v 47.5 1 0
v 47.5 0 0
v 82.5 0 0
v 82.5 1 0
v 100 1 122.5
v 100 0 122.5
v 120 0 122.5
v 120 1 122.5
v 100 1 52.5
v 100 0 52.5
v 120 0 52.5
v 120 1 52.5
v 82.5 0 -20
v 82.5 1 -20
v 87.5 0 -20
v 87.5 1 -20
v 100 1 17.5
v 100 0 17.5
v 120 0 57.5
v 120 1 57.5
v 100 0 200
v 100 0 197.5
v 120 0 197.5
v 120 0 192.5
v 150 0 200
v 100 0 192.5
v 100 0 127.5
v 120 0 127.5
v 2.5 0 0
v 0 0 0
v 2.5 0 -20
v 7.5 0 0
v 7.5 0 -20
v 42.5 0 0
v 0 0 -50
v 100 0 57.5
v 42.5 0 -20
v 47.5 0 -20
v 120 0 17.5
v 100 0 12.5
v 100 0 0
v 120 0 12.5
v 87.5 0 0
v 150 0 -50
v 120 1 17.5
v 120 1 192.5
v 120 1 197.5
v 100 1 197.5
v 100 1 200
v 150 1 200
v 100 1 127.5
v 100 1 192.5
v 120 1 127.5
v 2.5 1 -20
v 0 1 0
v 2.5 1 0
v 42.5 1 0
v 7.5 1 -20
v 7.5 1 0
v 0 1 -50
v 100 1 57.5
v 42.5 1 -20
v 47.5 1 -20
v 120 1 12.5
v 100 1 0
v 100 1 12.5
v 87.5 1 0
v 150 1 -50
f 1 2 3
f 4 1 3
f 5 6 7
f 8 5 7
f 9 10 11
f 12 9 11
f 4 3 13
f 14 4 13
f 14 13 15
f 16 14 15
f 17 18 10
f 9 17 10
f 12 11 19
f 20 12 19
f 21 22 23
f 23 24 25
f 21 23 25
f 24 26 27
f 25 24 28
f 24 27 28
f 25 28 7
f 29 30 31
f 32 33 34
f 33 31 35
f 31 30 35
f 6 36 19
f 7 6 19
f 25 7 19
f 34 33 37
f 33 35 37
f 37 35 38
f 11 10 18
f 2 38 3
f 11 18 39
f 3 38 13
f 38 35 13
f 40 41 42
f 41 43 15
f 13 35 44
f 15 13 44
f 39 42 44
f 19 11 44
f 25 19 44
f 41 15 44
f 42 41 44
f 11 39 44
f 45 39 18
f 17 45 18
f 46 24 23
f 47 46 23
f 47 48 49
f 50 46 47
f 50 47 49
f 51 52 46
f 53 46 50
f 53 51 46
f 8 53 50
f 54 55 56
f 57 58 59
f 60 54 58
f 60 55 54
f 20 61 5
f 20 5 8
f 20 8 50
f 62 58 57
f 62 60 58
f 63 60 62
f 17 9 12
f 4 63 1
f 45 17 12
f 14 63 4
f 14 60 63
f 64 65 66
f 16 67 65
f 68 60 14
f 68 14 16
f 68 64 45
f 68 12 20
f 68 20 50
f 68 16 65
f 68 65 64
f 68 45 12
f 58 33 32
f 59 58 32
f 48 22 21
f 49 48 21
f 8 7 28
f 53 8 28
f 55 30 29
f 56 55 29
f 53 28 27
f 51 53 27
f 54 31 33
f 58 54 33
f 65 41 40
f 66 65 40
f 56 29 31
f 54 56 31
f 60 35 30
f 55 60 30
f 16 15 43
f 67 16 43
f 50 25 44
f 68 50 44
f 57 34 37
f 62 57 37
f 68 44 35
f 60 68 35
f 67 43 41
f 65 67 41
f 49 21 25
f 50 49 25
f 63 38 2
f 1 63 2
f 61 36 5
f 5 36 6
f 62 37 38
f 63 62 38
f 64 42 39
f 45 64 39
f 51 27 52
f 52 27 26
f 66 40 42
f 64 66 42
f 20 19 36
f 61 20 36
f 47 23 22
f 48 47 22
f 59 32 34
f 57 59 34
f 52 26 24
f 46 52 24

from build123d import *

# Parameters (mm, degrees)
BOSS_EXTRUDE1_DEPTH = 1


with BuildPart() as part:
    # Sketch1 → Boss-Extrude1 (new body)
    with BuildSketch(Plane(origin=(0, 0, 0), x_dir=(1, 0, 0), z_dir=(0, 1, 0))):
        Polygon((0, 0), (2.5, 0), (2.5, 20), (7.5, 20), (7.5, 0), (42.5, 0), (42.5, 20), (47.5, 20), (47.5, 0), (82.5, 0), (82.5, 20), (87.5, 20), (87.5, 0), (100, 0), (100, -12.5), (120, -12.5), (120, -17.5), (100, -17.5), (100, -52.5), (120, -52.5), (120, -57.5), (100, -57.5), (100, -122.5), (120, -122.5), (120, -127.5), (100, -127.5), (100, -192.5), (120, -192.5), (120, -197.5), (100, -197.5), (100, -200), (150, -200), (150, 50), (0, 50), align=None)
    extrude(amount=BOSS_EXTRUDE1_DEPTH)


solid = part.part
